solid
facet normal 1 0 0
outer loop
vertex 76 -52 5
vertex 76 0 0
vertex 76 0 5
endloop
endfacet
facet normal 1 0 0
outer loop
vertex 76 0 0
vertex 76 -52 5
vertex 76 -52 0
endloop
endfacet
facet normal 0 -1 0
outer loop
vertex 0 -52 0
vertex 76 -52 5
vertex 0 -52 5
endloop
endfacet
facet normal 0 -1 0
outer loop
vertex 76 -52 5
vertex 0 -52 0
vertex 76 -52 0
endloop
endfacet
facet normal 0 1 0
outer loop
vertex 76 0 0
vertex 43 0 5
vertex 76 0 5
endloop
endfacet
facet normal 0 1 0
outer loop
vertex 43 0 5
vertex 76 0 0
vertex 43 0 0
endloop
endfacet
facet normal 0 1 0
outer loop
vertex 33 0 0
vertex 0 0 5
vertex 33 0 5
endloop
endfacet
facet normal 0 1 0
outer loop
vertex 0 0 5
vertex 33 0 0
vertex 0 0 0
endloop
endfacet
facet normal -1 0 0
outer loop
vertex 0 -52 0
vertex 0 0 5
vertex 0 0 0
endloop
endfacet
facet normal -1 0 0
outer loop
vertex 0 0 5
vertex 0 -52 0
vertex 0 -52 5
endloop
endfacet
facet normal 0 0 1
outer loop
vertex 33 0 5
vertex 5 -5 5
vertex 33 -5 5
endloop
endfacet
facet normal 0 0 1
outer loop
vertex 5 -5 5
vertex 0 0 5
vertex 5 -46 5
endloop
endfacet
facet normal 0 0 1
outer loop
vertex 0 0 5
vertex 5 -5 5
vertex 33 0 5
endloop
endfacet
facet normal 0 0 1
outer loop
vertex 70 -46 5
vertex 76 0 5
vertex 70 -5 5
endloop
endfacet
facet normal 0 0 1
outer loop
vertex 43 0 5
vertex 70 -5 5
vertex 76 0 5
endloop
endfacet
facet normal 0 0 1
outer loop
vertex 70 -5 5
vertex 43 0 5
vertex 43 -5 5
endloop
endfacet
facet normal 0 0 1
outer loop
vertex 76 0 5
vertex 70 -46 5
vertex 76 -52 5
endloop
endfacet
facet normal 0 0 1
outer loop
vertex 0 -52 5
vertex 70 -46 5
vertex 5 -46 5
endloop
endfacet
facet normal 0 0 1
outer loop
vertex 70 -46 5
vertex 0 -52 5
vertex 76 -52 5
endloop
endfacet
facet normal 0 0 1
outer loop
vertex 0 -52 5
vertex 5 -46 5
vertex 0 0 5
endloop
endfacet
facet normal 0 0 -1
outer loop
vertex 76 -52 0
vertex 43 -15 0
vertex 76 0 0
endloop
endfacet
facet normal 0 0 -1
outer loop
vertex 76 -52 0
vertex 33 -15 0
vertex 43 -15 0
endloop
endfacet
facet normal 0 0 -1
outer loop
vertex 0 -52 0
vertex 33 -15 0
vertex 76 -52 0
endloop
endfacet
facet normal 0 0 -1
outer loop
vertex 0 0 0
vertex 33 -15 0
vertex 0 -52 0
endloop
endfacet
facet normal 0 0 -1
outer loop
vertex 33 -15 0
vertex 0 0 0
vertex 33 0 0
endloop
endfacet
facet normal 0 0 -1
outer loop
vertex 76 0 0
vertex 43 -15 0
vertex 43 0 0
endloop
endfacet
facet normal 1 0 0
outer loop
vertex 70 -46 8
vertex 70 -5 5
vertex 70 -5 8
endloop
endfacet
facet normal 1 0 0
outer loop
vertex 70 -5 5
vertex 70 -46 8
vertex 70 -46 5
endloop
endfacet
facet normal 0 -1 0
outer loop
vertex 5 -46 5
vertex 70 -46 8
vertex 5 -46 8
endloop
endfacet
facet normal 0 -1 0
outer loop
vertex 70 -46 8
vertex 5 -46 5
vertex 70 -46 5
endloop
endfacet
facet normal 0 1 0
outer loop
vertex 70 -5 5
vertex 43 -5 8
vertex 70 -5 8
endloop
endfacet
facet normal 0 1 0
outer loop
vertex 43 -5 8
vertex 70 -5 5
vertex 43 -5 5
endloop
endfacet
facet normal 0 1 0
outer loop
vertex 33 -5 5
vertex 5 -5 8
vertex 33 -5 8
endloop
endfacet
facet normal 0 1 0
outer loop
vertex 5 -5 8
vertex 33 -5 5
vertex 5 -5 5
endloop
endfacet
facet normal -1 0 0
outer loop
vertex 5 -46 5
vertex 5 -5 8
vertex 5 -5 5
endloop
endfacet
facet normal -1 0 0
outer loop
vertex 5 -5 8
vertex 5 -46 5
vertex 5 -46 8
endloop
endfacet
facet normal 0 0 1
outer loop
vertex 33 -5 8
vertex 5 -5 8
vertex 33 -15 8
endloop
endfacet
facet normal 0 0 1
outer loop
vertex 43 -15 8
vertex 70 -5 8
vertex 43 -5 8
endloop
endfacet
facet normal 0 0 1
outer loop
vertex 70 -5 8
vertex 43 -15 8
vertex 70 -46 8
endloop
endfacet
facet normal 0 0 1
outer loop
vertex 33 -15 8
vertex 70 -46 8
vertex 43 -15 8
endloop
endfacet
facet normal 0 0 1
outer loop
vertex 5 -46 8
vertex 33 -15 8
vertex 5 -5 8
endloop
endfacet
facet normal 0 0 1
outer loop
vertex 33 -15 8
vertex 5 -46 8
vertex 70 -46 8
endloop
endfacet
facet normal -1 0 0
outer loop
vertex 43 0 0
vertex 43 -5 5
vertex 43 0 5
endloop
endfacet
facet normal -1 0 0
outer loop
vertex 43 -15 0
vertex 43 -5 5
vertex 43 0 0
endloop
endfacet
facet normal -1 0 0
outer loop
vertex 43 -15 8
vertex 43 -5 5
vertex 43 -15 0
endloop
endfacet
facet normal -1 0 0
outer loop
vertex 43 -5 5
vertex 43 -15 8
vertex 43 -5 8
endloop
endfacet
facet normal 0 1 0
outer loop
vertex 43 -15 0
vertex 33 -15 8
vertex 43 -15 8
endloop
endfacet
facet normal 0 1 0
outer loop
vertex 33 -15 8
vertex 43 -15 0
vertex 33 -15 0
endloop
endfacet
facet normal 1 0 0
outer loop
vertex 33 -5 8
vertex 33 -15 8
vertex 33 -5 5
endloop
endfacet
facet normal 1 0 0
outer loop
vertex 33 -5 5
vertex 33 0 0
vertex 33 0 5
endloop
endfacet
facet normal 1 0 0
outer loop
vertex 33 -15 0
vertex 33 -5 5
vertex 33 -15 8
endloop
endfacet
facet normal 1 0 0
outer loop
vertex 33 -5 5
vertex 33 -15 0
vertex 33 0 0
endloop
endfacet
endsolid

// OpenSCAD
rotate([90,0,0]){
     difference(){
	  union(){
	       cube([76, 5,52]);
	       translate([5,4,5]){
		    cube([65,4,41]);  
	       }
	  }
	  translate([33,-1,-1]){
	       cube([10,11,16]);  
	  }
     }
}
